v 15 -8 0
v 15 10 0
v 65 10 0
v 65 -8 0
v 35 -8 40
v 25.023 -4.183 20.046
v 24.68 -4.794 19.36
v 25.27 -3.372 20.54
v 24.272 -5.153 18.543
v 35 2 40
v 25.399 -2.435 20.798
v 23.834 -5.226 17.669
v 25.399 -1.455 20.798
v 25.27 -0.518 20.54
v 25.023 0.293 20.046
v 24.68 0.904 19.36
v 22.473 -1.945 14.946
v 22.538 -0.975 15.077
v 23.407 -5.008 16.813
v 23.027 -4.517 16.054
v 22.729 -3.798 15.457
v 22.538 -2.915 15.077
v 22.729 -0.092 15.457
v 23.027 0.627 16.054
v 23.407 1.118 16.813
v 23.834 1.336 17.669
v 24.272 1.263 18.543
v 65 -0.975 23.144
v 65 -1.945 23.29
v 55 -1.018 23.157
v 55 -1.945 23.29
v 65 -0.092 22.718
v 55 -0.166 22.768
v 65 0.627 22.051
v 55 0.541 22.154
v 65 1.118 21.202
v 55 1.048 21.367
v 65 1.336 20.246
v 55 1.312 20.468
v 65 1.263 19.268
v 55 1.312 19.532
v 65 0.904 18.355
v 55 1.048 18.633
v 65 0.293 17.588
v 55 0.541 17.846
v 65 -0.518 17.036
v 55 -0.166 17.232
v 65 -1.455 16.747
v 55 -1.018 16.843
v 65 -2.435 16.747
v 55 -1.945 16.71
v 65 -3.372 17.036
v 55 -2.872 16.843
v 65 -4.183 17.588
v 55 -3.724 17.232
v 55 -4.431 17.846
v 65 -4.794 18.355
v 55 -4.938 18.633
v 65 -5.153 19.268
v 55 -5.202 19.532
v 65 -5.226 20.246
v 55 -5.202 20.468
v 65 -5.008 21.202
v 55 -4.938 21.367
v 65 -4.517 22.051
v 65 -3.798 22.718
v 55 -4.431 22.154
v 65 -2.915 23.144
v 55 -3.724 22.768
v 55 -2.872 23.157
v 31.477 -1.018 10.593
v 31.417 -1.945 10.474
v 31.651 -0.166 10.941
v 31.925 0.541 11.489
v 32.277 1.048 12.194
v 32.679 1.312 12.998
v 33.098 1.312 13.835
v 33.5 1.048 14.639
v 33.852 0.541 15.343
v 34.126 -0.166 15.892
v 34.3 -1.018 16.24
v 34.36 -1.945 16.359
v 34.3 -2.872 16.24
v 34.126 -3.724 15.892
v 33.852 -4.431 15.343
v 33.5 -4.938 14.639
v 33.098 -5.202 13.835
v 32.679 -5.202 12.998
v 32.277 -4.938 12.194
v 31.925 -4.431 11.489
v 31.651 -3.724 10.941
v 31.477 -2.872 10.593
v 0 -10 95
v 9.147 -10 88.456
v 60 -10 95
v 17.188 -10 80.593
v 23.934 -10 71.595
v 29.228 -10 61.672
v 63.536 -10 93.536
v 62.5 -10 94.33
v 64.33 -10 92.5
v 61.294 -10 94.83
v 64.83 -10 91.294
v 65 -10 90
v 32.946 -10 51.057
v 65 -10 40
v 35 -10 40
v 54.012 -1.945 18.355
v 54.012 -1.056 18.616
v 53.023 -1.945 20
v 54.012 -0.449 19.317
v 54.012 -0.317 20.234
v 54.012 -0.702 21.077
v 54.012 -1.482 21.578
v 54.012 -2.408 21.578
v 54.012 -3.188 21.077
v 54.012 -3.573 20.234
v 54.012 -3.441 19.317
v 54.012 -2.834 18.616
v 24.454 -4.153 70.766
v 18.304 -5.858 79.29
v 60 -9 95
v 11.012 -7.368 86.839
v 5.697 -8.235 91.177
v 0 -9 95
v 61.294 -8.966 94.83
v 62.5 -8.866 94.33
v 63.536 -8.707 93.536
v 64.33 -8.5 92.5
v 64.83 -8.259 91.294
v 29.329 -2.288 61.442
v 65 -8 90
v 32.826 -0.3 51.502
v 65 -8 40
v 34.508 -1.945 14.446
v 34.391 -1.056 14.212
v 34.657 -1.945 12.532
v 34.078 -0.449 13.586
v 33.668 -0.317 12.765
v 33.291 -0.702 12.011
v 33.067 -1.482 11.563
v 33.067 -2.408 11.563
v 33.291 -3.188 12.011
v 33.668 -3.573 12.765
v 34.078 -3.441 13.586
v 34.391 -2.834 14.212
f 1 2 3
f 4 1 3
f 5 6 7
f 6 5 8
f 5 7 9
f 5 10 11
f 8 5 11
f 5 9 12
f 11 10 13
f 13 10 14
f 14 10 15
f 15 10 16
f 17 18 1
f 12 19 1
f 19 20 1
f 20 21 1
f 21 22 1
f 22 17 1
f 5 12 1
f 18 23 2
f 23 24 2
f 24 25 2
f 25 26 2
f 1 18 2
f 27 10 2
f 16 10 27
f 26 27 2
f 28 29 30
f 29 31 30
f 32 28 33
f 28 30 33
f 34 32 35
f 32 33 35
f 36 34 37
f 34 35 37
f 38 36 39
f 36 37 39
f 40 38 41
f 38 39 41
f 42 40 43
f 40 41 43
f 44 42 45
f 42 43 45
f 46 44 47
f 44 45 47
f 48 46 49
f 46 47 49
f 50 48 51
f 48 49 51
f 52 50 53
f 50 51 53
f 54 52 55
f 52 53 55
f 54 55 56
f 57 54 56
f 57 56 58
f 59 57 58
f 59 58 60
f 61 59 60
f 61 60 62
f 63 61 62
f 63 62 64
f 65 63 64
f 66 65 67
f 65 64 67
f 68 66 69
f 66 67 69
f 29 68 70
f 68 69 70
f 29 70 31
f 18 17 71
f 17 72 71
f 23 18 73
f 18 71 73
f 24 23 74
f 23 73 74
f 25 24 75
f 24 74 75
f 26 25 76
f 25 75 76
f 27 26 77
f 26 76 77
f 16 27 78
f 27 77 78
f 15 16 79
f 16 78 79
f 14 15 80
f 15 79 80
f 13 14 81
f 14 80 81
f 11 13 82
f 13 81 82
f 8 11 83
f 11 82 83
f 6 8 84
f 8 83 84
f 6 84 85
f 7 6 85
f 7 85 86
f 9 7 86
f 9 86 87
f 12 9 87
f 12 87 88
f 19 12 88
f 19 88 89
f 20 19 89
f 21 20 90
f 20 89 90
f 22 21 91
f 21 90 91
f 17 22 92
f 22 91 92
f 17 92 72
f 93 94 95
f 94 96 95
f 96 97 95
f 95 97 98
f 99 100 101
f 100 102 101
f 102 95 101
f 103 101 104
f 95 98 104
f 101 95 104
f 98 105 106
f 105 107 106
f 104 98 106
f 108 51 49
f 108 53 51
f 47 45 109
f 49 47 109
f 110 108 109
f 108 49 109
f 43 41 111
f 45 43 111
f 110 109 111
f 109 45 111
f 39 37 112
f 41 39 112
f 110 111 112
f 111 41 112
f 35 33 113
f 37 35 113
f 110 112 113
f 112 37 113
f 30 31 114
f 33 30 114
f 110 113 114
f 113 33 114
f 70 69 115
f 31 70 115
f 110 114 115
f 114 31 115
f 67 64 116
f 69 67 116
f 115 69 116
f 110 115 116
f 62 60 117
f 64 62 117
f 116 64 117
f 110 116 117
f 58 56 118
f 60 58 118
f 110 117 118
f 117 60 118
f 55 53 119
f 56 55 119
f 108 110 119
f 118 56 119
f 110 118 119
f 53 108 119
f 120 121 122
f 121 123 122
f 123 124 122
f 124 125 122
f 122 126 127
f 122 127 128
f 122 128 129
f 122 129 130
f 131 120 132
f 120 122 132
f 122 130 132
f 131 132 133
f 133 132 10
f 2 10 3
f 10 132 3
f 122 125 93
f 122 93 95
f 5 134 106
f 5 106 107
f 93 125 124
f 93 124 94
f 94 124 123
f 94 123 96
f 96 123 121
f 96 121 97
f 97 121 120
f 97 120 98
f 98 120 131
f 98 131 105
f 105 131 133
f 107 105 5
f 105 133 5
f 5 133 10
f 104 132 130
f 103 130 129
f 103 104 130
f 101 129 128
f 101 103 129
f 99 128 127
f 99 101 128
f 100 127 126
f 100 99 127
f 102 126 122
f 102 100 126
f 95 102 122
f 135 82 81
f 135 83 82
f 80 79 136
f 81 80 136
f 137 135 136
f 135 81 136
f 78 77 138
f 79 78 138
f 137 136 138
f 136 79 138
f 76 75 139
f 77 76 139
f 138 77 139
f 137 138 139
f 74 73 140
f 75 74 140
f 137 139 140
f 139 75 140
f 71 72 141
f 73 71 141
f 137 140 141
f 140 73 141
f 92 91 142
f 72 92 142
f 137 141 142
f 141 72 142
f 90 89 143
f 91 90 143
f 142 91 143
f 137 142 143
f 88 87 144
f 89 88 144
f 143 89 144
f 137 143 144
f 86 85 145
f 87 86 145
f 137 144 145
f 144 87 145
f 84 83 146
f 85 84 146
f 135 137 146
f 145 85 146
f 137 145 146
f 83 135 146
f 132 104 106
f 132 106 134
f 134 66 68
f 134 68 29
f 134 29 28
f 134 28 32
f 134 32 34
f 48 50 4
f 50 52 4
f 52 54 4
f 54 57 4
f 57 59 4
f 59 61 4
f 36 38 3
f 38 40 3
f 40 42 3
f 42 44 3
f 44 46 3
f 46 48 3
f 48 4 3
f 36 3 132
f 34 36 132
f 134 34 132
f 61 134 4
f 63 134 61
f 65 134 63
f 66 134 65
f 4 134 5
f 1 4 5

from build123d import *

# Parameters (mm, degrees)
ESBO_O1_W                                      = 130
ESBO_O1_H                                      = 20
RESSALTO_EXTRUS_O1_DEPTH                       = 95
CORTE_EXTRUS_O2_REACH                          = 22
CORTE_EXTRUS_O3_DEPTH                          = 1
CORTE_EXTRUS_O3_DEPTH_BACK                     = 66
BROCA_DE_ROSQUEAR_DE_CANO_PARA_TARRAXA_D_D     = 6.579997
BROCA_DE_ROSQUEAR_DE_CANO_PARA_TARRAXA_D_DEPTH = 10
BROCA_DE_ROSQUEAR_DE_CANO_PARA_TARRAXA_D_TIP   = 1.976830535
BROCA_DE_ROSQUEAR_DE_CANO_PARA_TARRA_2_D       = 6.579997
BROCA_DE_ROSQUEAR_DE_CANO_PARA_TARRA_2_DEPTH   = 10
BROCA_DE_ROSQUEAR_DE_CANO_PARA_TARRA_2_TIP     = 1.976830535
FILETE2_R                                      = 5
ESBO_O16_W                                     = 50
ESBO_O16_H                                     = 2
CORTE_EXTRUS_O6_DEPTH                          = 40


with BuildPart() as part:
    # Esboço1 → Ressalto-extrusão1 (new body)
    with BuildSketch(Plane.XY):
        Rectangle(ESBO_O1_W, ESBO_O1_H)
    extrude(amount=RESSALTO_EXTRUS_O1_DEPTH)

    # Esboço2 → Corte-extrusão2 (cut, up to next)
    with BuildSketch(Plane(origin=(0, 10, 0), x_dir=(1, 0, 0), z_dir=(0, 1, 0)), mode=Mode.PRIVATE) as corte_extrus_o2_sk1:
        with BuildLine():
            Line((15, 0), (-65, 0))
            Line((-65, 0), (-65, -95))
            Line((-65, -95), (0, -95))
            ThreePointArc((0, -95), (23.934348295, -71.594585279), (35, -40))
            Line((35, -40), (15, 0))
        make_face()
    corte_extrus_o2_tool1 = extrude(corte_extrus_o2_sk1.sketch, amount=-CORTE_EXTRUS_O2_REACH, mode=Mode.PRIVATE) & part.part
    add(corte_extrus_o2_tool1.solids().sort_by_distance((-20.013018, 10, 46.655676))[0], mode=Mode.SUBTRACT)

    # Esboço3 → Corte-extrusão3 (cut, two sides)
    with BuildSketch(Plane(origin=(65, 0, 0), x_dir=(0, 0, -1), z_dir=(1, 0, 0))) as corte_extrus_o3_sk:
        Polygon((200.200134404, 50.040026881), (0, 10), (-95, -9), (-295.200134404, -49.040026881), (-375.280188165, 351.360241926), (120.120080642, 450.440295688), align=None)
    extrude(amount=CORTE_EXTRUS_O3_DEPTH, mode=Mode.SUBTRACT)
    extrude(corte_extrus_o3_sk.sketch, amount=-CORTE_EXTRUS_O3_DEPTH_BACK, mode=Mode.SUBTRACT)

    # Broca de rosquear de cano para tarraxa d
    with Locations(Plane(origin=(65, 0, 0), x_dir=(0, 0, -1), z_dir=(1, 0, 0))):
        with Locations((-20, -1.945)):
            Hole(BROCA_DE_ROSQUEAR_DE_CANO_PARA_TARRAXA_D_D / 2, depth=BROCA_DE_ROSQUEAR_DE_CANO_PARA_TARRAXA_D_DEPTH)
            with Locations((0, 0, -(BROCA_DE_ROSQUEAR_DE_CANO_PARA_TARRAXA_D_DEPTH + BROCA_DE_ROSQUEAR_DE_CANO_PARA_TARRAXA_D_TIP / 2))):  # 118° drill point
                Cone(0, BROCA_DE_ROSQUEAR_DE_CANO_PARA_TARRAXA_D_D / 2, BROCA_DE_ROSQUEAR_DE_CANO_PARA_TARRAXA_D_TIP, mode=Mode.SUBTRACT)

    # Broca de rosquear de cano para tarra 2
    with Locations(Plane(origin=(12, 0, -6), x_dir=(0.447213595, 0, 0.894427191), z_dir=(-0.894427191, 0, 0.447213595))):
        with Locations((26.708203932, -1.945)):
            Hole(BROCA_DE_ROSQUEAR_DE_CANO_PARA_TARRA_2_D / 2, depth=BROCA_DE_ROSQUEAR_DE_CANO_PARA_TARRA_2_DEPTH)
            with Locations((0, 0, -(BROCA_DE_ROSQUEAR_DE_CANO_PARA_TARRA_2_DEPTH + BROCA_DE_ROSQUEAR_DE_CANO_PARA_TARRA_2_TIP / 2))):  # 118° drill point
                Cone(0, BROCA_DE_ROSQUEAR_DE_CANO_PARA_TARRA_2_D / 2, BROCA_DE_ROSQUEAR_DE_CANO_PARA_TARRA_2_TIP, mode=Mode.SUBTRACT)

    # Filete2
    filete2_edges = [part.edges().sort_by_distance(p)[0] for p in [
        (65, -9.5, 95),
    ]]
    fillet(filete2_edges, radius=FILETE2_R)

    # Esboço16 → Corte-extrusão6 (cut)
    with BuildSketch(Plane(origin=(0, 0, 0), x_dir=(-1, 0, 0), z_dir=(0, 0, -1))):
        with Locations((-40, -9)):
            Rectangle(ESBO_O16_W, ESBO_O16_H)
    extrude(amount=-CORTE_EXTRUS_O6_DEPTH, mode=Mode.SUBTRACT)


solid = part.part
